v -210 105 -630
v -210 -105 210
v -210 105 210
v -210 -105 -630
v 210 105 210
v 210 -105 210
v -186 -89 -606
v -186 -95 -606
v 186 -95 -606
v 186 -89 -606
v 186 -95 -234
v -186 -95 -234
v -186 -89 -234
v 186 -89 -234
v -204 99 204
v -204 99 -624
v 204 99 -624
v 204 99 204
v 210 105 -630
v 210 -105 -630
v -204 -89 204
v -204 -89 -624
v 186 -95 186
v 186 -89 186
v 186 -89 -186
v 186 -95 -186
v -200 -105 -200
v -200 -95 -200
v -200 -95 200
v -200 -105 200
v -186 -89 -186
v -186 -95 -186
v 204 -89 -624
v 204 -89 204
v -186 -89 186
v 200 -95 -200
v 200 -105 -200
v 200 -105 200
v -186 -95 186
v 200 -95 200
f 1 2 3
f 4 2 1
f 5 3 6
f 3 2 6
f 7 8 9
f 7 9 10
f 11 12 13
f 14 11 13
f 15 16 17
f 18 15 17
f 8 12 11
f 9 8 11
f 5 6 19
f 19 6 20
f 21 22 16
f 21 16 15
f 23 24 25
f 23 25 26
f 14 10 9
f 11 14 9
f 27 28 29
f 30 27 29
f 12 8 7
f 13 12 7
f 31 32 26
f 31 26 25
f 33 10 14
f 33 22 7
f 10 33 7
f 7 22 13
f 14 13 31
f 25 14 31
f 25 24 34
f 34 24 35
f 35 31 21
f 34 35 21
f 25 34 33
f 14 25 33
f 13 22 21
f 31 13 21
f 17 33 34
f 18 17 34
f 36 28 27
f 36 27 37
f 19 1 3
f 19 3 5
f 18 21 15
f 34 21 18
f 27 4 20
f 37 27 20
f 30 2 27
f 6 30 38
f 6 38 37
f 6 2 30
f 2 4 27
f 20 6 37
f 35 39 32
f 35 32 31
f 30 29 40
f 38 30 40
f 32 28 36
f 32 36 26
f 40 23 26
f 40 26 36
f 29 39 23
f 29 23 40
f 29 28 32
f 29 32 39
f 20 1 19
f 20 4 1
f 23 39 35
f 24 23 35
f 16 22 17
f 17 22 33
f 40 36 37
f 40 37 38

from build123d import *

# Parameters (mm, degrees)
F0_W      = 420
F0_H      = 420
F1_DEPTH  = 105
F2_T      = -6
F3_W      = 6
F3_H      = 408
F4_DEPTH  = 18
F5_W      = 6
F5_H      = 408
F6_DEPTH  = 18
F7_W      = 6
F7_H      = 18
F8_DEPTH  = 372
F9_W      = 6
F9_H      = 18
F10_DEPTH = 372
F11_W     = 408
F11_H     = 408
F11_W_2   = 400
F11_H_2   = 400
F12_DEPTH = 10
F14_W     = 400
F14_H     = 400
F15_DEPTH = 10
F16_DEPTH = 25.4


with BuildPart() as f1:
    # F0 (on Front) → F1 (new body, symmetric)
    with BuildSketch(Plane.XZ):
        Rectangle(F0_W, F0_H)
    extrude(amount=F1_DEPTH, both=True)

    # F2
    f2_openings = [f1.faces().sort_by_distance(p)[0] for p in [
        (0, -105, 0),
    ]]
    offset(amount=F2_T, openings=f2_openings)

    # F3 (on face) → F4 (join)
    with BuildSketch(Plane.YZ.offset(-204)):
        with Locations((-92, 0)):
            Rectangle(F3_W, F3_H)
    extrude(amount=F4_DEPTH)

    # F5 (on face) → F6 (join)
    with BuildSketch(Plane(origin=(204, 0, 0), x_dir=(0, -1, 0), z_dir=(-1, 0, 0))):
        with Locations((92, 0)):
            Rectangle(F5_W, F5_H)
    extrude(amount=F6_DEPTH)

    # F7 (on face) → F8 (join, through all)
    with BuildSketch(Plane.YZ.offset(-186)):
        with Locations((-92, 195)):
            Rectangle(F7_W, F7_H)
    extrude(amount=F8_DEPTH)

    # F9 (on face) → F10 (join, through all)
    with BuildSketch(Plane.YZ.offset(-186)):
        with Locations((-92, -195)):
            Rectangle(F9_W, F9_H)
    extrude(amount=F10_DEPTH)

    # F11 (on face) → F12 (join)
    with BuildSketch(Plane.XZ.offset(95)):
        Rectangle(F11_W, F11_H)
        Rectangle(F11_W_2, F11_H_2, mode=Mode.SUBTRACT)
    extrude(amount=F12_DEPTH)

    # F13: F1 across face


with BuildPart() as f1_1:
    add(f1.part)
    add(f1.part.mirror(Plane(origin=(0, 0, -210), x_dir=(1, 0, 0), z_dir=(0, 0, -1))))

    # F14 (on face) → F15 (join)
    with BuildSketch(Plane.XZ.offset(95)):
        with Locations((0, -420)):
            Rectangle(F14_W, F14_H)
    extrude(amount=F15_DEPTH)

    # F16 (cut): a face of the model
    f16_faces = [f1_1.faces().sort_by_distance(p)[0] for p in [
        (0, 5, -204),
    ]]
    extrude(f16_faces, amount=-F16_DEPTH, mode=Mode.SUBTRACT)


solid = f1_1.part
